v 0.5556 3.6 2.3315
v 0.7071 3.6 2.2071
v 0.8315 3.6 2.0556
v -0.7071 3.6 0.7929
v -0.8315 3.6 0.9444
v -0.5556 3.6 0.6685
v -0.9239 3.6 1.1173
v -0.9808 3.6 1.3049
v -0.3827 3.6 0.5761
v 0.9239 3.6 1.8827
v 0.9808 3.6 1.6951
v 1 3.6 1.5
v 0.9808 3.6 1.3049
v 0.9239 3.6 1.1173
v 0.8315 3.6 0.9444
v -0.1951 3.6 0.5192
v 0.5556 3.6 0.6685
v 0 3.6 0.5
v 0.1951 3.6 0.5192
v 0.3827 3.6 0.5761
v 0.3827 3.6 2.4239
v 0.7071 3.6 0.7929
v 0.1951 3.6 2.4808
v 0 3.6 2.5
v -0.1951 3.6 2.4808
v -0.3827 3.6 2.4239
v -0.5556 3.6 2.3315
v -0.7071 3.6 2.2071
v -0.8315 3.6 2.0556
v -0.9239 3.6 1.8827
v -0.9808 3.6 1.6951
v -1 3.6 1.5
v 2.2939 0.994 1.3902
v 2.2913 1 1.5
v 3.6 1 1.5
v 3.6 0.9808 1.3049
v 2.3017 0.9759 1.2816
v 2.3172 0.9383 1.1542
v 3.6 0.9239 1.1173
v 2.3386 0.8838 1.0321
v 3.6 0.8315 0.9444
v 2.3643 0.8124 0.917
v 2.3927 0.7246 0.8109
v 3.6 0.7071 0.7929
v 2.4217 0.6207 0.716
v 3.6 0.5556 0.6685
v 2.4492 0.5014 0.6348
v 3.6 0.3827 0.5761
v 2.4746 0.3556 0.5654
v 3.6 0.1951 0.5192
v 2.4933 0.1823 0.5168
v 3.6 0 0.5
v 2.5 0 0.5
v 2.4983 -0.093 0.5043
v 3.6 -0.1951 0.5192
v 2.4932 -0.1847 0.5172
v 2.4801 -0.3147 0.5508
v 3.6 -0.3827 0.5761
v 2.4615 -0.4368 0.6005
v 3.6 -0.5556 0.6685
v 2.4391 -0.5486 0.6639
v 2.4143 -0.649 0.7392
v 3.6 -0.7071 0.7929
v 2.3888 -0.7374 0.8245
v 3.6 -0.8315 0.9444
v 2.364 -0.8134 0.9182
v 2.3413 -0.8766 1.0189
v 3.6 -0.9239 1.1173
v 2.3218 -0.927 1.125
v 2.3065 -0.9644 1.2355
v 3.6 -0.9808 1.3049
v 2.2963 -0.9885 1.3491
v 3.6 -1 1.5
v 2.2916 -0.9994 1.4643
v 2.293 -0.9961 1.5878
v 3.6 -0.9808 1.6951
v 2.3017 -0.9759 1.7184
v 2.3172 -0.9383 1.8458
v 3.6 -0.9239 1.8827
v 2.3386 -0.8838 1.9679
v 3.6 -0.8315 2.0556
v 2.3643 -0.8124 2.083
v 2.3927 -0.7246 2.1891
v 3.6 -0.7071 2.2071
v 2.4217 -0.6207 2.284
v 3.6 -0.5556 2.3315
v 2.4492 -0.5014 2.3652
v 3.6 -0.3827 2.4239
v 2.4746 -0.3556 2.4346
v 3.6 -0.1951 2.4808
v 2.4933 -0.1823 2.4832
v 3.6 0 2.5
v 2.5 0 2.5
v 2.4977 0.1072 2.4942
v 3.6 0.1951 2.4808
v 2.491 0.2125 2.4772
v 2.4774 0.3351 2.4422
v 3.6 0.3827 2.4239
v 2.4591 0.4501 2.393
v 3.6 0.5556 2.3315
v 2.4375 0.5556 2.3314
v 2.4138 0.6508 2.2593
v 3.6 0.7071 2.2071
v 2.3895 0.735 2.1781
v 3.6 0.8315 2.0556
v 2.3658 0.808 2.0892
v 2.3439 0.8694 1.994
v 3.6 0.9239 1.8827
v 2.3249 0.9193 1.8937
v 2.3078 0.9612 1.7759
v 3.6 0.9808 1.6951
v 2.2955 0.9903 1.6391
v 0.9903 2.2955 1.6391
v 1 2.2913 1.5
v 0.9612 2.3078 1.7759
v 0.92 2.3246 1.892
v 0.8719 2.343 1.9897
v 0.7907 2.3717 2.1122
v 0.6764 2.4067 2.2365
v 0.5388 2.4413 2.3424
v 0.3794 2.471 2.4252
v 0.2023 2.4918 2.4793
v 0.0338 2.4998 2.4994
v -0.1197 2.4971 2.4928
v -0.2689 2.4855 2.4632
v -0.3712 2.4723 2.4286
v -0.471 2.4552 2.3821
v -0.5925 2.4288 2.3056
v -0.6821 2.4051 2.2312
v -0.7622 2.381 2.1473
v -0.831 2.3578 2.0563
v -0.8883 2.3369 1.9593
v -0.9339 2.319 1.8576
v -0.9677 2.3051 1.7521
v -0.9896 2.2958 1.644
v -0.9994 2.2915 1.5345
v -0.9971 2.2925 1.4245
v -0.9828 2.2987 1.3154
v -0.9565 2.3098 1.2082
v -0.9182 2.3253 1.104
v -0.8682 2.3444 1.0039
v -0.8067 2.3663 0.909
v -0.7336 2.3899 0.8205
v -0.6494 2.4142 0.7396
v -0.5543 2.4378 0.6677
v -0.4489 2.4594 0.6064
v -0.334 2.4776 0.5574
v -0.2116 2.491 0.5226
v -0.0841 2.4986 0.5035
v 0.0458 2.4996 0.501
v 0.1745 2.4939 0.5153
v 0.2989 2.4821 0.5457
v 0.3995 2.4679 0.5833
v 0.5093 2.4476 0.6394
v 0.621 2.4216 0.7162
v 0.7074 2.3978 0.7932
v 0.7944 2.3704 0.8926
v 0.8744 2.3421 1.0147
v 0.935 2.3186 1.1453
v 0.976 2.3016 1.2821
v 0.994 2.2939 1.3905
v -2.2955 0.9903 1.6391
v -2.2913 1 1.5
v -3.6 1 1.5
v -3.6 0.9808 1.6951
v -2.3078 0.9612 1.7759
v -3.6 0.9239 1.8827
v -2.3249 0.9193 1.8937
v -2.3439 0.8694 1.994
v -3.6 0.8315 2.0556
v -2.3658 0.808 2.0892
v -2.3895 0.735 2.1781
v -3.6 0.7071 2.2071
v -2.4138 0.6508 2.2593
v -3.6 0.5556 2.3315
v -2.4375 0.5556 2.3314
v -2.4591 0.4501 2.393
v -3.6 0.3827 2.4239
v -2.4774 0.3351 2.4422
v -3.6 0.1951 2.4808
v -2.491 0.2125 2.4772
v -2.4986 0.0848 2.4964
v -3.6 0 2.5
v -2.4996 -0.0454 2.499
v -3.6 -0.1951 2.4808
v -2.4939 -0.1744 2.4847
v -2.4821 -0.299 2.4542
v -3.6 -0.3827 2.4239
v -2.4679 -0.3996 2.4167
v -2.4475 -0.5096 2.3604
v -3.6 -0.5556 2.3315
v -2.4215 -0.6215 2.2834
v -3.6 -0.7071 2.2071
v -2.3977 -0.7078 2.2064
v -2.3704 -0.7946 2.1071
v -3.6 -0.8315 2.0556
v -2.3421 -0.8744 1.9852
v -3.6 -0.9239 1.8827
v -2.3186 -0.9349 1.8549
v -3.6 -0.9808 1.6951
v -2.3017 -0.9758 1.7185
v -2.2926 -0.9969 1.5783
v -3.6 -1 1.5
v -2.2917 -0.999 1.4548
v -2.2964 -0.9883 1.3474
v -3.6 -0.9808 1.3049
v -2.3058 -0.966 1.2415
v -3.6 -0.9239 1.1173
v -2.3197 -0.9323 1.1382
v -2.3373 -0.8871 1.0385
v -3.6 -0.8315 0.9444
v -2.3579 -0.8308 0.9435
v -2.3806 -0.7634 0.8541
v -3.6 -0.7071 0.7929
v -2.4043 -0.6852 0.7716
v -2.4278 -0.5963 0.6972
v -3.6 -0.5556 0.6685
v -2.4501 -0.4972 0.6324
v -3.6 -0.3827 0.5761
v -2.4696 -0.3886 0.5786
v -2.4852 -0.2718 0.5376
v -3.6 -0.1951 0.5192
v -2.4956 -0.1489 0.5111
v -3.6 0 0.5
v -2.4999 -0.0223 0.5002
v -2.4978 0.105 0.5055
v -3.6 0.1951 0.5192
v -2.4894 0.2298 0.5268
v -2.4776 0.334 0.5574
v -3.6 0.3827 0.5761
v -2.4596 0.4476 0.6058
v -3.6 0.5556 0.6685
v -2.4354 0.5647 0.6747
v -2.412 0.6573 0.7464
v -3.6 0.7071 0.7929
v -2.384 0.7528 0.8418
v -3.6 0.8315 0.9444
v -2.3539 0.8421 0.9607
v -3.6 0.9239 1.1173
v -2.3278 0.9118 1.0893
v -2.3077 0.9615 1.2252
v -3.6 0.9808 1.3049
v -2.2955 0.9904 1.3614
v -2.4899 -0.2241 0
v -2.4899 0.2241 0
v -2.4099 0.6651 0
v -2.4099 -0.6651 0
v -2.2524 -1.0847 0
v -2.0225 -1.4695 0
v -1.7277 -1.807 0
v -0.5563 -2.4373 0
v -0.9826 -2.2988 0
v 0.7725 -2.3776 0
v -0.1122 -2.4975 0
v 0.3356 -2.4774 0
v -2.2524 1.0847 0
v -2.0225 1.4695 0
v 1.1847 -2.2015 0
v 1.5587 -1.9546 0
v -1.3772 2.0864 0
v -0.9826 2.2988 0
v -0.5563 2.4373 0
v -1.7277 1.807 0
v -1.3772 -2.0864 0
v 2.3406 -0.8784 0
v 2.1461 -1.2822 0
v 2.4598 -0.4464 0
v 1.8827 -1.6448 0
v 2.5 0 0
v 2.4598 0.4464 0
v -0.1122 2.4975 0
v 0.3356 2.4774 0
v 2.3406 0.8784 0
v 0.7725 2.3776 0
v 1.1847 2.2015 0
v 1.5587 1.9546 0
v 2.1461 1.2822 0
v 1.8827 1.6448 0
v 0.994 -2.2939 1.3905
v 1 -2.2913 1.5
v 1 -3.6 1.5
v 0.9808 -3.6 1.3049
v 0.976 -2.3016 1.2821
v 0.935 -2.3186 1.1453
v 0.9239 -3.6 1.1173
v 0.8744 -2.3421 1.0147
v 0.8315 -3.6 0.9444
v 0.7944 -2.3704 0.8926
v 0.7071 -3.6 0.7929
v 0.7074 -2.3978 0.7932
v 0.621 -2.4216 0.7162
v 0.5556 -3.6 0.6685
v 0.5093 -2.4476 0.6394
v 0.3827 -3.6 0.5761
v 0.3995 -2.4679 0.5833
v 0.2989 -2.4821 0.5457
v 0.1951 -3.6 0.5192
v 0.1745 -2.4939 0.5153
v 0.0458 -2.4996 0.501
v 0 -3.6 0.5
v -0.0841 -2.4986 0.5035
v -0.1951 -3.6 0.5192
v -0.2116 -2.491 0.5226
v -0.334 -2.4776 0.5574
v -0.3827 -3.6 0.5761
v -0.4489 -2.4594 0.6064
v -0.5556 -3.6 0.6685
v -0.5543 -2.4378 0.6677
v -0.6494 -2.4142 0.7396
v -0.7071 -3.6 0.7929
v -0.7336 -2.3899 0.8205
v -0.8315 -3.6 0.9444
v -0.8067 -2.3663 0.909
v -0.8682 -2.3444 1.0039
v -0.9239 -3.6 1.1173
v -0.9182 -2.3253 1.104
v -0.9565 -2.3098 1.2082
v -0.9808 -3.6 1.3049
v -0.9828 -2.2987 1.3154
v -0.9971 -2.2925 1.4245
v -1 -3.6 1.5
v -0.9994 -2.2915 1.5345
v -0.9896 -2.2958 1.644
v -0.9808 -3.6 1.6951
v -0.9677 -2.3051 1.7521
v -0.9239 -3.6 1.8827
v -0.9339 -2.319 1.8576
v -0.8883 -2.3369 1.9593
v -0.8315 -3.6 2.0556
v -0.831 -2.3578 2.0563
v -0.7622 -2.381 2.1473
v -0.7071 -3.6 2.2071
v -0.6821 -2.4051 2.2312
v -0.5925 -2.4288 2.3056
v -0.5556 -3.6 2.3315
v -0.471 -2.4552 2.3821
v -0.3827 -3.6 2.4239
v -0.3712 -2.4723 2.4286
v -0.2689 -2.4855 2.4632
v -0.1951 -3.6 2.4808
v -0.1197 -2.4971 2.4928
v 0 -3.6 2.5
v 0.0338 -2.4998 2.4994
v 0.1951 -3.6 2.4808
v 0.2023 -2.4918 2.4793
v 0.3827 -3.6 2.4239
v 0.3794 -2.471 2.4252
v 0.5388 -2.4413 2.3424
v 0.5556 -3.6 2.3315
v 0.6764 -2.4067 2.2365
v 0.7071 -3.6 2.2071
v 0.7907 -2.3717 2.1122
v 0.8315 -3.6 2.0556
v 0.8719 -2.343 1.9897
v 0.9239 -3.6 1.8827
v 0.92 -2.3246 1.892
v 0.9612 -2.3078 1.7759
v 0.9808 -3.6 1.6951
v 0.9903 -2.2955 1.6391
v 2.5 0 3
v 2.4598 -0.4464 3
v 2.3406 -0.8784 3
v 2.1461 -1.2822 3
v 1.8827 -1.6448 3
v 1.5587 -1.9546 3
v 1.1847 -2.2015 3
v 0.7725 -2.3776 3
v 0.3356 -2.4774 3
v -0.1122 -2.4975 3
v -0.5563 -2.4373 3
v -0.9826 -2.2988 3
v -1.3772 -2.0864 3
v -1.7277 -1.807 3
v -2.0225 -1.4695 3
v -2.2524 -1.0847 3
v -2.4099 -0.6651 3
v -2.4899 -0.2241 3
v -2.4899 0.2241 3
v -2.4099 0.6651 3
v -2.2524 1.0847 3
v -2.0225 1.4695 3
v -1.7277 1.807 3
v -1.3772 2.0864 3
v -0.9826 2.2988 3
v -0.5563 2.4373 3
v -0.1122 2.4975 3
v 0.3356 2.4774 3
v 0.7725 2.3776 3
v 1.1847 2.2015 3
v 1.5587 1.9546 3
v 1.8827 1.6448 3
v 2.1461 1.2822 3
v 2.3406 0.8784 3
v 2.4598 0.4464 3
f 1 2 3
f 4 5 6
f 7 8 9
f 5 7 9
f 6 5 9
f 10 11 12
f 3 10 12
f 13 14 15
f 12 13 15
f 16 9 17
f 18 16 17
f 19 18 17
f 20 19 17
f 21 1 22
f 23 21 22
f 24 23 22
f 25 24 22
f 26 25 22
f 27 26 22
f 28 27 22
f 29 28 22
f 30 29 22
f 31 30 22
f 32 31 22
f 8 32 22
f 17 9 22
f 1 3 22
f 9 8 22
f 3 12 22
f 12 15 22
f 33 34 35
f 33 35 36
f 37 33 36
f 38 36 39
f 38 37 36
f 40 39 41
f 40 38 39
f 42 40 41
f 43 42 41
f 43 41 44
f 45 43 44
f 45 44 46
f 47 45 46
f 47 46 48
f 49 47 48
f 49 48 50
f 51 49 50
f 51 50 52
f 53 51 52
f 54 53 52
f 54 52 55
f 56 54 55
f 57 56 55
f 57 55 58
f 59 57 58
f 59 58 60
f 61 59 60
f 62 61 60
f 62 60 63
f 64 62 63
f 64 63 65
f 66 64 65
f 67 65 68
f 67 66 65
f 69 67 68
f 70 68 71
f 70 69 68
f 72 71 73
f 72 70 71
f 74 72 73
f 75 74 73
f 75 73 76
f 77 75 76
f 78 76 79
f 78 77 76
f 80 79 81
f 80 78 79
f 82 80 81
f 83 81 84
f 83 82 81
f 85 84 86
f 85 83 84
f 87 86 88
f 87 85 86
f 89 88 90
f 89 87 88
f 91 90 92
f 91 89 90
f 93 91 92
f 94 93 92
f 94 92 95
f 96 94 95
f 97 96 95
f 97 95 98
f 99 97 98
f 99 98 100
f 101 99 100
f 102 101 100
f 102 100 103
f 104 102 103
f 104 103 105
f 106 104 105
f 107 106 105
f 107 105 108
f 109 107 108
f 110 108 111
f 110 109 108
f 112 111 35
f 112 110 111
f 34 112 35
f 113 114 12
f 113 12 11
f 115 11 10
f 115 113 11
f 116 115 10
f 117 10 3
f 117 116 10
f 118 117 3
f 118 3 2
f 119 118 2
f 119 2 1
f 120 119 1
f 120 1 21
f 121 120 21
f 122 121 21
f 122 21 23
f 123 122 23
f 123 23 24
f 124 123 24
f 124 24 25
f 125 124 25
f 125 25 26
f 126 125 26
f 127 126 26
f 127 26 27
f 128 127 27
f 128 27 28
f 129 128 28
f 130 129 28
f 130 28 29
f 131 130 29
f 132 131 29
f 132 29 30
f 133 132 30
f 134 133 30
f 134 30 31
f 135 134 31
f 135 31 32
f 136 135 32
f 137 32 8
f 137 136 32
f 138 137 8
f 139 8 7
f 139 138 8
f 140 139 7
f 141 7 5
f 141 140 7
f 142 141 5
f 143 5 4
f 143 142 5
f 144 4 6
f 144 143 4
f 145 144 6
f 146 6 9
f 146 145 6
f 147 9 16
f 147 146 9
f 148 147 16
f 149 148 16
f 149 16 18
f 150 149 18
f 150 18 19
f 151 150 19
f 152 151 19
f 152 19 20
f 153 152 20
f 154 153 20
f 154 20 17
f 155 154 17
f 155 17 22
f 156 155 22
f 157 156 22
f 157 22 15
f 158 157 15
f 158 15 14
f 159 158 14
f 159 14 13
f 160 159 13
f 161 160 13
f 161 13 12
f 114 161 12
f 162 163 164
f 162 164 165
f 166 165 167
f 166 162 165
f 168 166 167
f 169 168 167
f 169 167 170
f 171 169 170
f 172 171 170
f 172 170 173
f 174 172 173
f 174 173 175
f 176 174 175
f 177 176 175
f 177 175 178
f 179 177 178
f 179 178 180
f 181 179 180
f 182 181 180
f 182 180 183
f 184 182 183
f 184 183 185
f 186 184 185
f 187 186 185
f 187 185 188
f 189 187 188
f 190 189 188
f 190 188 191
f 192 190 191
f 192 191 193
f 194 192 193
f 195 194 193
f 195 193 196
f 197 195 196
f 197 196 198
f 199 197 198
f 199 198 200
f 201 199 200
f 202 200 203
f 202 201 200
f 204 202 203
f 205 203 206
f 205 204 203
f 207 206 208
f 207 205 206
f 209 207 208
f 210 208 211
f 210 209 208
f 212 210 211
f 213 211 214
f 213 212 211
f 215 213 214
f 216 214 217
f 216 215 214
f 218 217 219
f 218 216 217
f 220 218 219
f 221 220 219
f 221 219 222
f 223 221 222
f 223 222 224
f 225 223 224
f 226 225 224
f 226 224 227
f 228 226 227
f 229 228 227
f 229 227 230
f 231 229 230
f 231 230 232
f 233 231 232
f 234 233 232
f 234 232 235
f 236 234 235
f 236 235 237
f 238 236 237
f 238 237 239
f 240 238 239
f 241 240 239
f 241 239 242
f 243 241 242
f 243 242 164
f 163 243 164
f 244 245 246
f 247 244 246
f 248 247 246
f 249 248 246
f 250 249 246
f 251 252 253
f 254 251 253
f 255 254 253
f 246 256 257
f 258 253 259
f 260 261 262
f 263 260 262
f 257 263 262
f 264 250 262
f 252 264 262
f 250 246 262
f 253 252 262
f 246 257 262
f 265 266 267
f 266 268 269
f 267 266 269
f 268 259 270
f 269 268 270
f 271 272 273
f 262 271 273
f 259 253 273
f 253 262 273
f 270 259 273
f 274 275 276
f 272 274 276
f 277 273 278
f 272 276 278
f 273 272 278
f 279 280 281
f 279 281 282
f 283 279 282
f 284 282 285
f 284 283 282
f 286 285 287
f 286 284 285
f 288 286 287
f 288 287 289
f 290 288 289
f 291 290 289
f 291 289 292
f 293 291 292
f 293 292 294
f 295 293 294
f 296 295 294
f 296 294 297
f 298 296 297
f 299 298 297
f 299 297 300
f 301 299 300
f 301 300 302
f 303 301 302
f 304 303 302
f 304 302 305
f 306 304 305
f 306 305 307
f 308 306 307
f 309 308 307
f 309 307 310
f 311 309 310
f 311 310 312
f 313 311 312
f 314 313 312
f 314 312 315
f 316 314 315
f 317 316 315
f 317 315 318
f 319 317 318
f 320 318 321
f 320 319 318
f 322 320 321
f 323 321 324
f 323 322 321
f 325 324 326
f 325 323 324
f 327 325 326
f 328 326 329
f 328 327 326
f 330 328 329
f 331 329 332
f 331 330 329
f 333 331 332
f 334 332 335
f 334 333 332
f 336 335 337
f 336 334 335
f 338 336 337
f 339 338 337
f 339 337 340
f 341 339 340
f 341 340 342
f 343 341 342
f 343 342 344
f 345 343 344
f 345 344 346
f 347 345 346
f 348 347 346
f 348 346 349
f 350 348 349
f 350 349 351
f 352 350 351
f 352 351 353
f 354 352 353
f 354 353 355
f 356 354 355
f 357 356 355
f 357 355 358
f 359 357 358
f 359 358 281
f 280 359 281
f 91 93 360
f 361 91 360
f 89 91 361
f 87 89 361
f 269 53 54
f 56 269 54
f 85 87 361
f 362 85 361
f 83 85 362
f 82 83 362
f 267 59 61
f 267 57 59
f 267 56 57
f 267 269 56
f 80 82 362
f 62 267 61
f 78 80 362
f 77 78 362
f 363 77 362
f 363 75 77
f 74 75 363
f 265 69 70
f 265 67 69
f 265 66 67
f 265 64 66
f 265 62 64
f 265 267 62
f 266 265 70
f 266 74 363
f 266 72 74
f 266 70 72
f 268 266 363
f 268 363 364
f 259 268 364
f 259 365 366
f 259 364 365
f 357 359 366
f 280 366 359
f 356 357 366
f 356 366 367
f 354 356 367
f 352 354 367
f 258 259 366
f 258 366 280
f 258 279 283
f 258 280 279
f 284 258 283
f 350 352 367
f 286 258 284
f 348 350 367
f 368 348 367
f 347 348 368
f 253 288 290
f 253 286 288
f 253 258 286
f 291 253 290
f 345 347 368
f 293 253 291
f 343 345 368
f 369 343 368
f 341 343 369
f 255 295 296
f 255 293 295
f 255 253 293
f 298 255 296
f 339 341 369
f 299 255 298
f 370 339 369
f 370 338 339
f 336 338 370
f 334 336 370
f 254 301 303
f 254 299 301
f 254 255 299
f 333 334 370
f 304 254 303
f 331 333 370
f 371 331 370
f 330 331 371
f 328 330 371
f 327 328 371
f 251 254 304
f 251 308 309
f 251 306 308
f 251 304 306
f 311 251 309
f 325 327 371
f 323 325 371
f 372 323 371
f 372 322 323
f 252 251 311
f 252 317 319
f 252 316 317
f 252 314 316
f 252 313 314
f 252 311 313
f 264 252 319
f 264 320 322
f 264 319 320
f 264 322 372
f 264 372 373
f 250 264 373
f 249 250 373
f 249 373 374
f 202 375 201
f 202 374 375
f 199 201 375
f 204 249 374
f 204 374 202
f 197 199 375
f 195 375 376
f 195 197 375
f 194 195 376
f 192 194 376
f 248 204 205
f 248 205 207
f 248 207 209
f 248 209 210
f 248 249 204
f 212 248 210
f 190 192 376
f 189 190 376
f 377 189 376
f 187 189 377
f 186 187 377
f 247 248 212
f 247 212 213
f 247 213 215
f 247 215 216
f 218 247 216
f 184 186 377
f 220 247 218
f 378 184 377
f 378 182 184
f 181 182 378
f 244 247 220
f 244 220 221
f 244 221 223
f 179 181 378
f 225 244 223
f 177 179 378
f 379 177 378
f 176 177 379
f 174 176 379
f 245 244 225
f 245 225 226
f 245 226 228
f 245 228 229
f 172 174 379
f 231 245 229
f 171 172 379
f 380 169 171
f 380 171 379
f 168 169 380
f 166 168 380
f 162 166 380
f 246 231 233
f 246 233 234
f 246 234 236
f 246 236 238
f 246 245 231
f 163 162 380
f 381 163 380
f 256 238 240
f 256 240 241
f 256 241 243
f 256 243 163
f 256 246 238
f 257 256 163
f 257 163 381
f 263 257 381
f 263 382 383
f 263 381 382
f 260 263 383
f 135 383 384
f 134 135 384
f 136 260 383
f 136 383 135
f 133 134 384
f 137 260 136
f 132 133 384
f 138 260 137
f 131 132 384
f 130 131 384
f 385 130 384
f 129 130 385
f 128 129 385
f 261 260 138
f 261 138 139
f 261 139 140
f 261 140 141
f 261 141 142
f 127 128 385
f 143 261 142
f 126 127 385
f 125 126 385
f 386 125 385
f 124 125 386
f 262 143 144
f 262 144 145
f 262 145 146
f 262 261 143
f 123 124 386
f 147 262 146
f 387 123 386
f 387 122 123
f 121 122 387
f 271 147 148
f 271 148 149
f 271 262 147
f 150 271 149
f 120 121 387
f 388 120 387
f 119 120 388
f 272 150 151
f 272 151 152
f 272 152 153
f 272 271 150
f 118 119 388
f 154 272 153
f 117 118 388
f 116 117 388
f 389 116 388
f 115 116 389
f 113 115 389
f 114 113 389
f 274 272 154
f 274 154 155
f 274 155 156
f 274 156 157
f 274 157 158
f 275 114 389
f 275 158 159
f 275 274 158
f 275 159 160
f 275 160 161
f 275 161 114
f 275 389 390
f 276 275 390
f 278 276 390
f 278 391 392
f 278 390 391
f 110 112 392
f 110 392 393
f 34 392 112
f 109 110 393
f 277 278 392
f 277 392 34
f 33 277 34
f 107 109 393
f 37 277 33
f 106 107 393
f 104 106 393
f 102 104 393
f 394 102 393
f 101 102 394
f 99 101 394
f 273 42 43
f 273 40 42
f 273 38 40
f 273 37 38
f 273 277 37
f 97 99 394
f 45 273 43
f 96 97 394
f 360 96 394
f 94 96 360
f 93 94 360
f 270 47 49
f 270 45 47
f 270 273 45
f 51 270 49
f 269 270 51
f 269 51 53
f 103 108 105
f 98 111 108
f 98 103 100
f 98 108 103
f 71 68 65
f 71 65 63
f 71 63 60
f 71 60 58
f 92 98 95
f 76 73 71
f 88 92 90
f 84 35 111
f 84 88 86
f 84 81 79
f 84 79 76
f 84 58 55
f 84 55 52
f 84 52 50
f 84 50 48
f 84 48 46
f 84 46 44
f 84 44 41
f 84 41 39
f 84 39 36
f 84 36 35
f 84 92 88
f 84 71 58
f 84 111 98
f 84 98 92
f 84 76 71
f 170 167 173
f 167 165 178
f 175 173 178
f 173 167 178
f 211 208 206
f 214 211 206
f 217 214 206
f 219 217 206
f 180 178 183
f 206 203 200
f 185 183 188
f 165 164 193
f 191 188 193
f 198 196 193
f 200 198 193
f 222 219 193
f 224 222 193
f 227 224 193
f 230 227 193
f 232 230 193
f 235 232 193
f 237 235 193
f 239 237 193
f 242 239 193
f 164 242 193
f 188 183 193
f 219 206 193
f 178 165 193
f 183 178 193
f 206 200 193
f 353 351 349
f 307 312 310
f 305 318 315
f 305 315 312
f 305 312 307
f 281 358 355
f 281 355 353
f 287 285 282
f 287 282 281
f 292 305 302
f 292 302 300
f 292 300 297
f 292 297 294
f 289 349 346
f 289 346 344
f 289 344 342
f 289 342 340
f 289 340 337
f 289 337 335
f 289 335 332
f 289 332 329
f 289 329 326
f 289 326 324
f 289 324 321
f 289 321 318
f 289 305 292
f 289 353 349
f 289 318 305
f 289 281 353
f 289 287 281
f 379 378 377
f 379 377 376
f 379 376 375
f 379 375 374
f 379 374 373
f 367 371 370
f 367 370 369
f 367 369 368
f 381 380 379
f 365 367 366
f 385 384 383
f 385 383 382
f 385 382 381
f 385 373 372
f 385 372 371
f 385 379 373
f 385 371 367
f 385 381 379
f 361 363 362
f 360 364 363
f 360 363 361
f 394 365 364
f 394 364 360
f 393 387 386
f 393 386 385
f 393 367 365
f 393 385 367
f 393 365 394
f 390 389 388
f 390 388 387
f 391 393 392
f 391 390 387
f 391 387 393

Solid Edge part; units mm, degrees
sketch "Sketch1" plane through (0, 0, 0) normal (0, 0, 1) x (1, 0, 0)
  circle A0 centre (0, 0) radius 2.5
extrude "Protrusion1" add sketch "Sketch1" along normal blind 3
sketch "Sketch2" plane through (0, 0, 0) normal (1, 0, 0) x (0, 1, 0)
  circle A0 centre (0, 1.5) radius 1
extrude "ExtrudedCutout_1" add sketch "Sketch2" along normal mid plane 7.2
sketch "Sketch3" plane through (0, 0, 0) normal (0, -1, 0) x (1, 0, 0)
  circle A0 centre (0, 1.5) radius 1
extrude "ExtrudedProtrusion_3" add sketch "Sketch3" along normal mid plane 7.2
